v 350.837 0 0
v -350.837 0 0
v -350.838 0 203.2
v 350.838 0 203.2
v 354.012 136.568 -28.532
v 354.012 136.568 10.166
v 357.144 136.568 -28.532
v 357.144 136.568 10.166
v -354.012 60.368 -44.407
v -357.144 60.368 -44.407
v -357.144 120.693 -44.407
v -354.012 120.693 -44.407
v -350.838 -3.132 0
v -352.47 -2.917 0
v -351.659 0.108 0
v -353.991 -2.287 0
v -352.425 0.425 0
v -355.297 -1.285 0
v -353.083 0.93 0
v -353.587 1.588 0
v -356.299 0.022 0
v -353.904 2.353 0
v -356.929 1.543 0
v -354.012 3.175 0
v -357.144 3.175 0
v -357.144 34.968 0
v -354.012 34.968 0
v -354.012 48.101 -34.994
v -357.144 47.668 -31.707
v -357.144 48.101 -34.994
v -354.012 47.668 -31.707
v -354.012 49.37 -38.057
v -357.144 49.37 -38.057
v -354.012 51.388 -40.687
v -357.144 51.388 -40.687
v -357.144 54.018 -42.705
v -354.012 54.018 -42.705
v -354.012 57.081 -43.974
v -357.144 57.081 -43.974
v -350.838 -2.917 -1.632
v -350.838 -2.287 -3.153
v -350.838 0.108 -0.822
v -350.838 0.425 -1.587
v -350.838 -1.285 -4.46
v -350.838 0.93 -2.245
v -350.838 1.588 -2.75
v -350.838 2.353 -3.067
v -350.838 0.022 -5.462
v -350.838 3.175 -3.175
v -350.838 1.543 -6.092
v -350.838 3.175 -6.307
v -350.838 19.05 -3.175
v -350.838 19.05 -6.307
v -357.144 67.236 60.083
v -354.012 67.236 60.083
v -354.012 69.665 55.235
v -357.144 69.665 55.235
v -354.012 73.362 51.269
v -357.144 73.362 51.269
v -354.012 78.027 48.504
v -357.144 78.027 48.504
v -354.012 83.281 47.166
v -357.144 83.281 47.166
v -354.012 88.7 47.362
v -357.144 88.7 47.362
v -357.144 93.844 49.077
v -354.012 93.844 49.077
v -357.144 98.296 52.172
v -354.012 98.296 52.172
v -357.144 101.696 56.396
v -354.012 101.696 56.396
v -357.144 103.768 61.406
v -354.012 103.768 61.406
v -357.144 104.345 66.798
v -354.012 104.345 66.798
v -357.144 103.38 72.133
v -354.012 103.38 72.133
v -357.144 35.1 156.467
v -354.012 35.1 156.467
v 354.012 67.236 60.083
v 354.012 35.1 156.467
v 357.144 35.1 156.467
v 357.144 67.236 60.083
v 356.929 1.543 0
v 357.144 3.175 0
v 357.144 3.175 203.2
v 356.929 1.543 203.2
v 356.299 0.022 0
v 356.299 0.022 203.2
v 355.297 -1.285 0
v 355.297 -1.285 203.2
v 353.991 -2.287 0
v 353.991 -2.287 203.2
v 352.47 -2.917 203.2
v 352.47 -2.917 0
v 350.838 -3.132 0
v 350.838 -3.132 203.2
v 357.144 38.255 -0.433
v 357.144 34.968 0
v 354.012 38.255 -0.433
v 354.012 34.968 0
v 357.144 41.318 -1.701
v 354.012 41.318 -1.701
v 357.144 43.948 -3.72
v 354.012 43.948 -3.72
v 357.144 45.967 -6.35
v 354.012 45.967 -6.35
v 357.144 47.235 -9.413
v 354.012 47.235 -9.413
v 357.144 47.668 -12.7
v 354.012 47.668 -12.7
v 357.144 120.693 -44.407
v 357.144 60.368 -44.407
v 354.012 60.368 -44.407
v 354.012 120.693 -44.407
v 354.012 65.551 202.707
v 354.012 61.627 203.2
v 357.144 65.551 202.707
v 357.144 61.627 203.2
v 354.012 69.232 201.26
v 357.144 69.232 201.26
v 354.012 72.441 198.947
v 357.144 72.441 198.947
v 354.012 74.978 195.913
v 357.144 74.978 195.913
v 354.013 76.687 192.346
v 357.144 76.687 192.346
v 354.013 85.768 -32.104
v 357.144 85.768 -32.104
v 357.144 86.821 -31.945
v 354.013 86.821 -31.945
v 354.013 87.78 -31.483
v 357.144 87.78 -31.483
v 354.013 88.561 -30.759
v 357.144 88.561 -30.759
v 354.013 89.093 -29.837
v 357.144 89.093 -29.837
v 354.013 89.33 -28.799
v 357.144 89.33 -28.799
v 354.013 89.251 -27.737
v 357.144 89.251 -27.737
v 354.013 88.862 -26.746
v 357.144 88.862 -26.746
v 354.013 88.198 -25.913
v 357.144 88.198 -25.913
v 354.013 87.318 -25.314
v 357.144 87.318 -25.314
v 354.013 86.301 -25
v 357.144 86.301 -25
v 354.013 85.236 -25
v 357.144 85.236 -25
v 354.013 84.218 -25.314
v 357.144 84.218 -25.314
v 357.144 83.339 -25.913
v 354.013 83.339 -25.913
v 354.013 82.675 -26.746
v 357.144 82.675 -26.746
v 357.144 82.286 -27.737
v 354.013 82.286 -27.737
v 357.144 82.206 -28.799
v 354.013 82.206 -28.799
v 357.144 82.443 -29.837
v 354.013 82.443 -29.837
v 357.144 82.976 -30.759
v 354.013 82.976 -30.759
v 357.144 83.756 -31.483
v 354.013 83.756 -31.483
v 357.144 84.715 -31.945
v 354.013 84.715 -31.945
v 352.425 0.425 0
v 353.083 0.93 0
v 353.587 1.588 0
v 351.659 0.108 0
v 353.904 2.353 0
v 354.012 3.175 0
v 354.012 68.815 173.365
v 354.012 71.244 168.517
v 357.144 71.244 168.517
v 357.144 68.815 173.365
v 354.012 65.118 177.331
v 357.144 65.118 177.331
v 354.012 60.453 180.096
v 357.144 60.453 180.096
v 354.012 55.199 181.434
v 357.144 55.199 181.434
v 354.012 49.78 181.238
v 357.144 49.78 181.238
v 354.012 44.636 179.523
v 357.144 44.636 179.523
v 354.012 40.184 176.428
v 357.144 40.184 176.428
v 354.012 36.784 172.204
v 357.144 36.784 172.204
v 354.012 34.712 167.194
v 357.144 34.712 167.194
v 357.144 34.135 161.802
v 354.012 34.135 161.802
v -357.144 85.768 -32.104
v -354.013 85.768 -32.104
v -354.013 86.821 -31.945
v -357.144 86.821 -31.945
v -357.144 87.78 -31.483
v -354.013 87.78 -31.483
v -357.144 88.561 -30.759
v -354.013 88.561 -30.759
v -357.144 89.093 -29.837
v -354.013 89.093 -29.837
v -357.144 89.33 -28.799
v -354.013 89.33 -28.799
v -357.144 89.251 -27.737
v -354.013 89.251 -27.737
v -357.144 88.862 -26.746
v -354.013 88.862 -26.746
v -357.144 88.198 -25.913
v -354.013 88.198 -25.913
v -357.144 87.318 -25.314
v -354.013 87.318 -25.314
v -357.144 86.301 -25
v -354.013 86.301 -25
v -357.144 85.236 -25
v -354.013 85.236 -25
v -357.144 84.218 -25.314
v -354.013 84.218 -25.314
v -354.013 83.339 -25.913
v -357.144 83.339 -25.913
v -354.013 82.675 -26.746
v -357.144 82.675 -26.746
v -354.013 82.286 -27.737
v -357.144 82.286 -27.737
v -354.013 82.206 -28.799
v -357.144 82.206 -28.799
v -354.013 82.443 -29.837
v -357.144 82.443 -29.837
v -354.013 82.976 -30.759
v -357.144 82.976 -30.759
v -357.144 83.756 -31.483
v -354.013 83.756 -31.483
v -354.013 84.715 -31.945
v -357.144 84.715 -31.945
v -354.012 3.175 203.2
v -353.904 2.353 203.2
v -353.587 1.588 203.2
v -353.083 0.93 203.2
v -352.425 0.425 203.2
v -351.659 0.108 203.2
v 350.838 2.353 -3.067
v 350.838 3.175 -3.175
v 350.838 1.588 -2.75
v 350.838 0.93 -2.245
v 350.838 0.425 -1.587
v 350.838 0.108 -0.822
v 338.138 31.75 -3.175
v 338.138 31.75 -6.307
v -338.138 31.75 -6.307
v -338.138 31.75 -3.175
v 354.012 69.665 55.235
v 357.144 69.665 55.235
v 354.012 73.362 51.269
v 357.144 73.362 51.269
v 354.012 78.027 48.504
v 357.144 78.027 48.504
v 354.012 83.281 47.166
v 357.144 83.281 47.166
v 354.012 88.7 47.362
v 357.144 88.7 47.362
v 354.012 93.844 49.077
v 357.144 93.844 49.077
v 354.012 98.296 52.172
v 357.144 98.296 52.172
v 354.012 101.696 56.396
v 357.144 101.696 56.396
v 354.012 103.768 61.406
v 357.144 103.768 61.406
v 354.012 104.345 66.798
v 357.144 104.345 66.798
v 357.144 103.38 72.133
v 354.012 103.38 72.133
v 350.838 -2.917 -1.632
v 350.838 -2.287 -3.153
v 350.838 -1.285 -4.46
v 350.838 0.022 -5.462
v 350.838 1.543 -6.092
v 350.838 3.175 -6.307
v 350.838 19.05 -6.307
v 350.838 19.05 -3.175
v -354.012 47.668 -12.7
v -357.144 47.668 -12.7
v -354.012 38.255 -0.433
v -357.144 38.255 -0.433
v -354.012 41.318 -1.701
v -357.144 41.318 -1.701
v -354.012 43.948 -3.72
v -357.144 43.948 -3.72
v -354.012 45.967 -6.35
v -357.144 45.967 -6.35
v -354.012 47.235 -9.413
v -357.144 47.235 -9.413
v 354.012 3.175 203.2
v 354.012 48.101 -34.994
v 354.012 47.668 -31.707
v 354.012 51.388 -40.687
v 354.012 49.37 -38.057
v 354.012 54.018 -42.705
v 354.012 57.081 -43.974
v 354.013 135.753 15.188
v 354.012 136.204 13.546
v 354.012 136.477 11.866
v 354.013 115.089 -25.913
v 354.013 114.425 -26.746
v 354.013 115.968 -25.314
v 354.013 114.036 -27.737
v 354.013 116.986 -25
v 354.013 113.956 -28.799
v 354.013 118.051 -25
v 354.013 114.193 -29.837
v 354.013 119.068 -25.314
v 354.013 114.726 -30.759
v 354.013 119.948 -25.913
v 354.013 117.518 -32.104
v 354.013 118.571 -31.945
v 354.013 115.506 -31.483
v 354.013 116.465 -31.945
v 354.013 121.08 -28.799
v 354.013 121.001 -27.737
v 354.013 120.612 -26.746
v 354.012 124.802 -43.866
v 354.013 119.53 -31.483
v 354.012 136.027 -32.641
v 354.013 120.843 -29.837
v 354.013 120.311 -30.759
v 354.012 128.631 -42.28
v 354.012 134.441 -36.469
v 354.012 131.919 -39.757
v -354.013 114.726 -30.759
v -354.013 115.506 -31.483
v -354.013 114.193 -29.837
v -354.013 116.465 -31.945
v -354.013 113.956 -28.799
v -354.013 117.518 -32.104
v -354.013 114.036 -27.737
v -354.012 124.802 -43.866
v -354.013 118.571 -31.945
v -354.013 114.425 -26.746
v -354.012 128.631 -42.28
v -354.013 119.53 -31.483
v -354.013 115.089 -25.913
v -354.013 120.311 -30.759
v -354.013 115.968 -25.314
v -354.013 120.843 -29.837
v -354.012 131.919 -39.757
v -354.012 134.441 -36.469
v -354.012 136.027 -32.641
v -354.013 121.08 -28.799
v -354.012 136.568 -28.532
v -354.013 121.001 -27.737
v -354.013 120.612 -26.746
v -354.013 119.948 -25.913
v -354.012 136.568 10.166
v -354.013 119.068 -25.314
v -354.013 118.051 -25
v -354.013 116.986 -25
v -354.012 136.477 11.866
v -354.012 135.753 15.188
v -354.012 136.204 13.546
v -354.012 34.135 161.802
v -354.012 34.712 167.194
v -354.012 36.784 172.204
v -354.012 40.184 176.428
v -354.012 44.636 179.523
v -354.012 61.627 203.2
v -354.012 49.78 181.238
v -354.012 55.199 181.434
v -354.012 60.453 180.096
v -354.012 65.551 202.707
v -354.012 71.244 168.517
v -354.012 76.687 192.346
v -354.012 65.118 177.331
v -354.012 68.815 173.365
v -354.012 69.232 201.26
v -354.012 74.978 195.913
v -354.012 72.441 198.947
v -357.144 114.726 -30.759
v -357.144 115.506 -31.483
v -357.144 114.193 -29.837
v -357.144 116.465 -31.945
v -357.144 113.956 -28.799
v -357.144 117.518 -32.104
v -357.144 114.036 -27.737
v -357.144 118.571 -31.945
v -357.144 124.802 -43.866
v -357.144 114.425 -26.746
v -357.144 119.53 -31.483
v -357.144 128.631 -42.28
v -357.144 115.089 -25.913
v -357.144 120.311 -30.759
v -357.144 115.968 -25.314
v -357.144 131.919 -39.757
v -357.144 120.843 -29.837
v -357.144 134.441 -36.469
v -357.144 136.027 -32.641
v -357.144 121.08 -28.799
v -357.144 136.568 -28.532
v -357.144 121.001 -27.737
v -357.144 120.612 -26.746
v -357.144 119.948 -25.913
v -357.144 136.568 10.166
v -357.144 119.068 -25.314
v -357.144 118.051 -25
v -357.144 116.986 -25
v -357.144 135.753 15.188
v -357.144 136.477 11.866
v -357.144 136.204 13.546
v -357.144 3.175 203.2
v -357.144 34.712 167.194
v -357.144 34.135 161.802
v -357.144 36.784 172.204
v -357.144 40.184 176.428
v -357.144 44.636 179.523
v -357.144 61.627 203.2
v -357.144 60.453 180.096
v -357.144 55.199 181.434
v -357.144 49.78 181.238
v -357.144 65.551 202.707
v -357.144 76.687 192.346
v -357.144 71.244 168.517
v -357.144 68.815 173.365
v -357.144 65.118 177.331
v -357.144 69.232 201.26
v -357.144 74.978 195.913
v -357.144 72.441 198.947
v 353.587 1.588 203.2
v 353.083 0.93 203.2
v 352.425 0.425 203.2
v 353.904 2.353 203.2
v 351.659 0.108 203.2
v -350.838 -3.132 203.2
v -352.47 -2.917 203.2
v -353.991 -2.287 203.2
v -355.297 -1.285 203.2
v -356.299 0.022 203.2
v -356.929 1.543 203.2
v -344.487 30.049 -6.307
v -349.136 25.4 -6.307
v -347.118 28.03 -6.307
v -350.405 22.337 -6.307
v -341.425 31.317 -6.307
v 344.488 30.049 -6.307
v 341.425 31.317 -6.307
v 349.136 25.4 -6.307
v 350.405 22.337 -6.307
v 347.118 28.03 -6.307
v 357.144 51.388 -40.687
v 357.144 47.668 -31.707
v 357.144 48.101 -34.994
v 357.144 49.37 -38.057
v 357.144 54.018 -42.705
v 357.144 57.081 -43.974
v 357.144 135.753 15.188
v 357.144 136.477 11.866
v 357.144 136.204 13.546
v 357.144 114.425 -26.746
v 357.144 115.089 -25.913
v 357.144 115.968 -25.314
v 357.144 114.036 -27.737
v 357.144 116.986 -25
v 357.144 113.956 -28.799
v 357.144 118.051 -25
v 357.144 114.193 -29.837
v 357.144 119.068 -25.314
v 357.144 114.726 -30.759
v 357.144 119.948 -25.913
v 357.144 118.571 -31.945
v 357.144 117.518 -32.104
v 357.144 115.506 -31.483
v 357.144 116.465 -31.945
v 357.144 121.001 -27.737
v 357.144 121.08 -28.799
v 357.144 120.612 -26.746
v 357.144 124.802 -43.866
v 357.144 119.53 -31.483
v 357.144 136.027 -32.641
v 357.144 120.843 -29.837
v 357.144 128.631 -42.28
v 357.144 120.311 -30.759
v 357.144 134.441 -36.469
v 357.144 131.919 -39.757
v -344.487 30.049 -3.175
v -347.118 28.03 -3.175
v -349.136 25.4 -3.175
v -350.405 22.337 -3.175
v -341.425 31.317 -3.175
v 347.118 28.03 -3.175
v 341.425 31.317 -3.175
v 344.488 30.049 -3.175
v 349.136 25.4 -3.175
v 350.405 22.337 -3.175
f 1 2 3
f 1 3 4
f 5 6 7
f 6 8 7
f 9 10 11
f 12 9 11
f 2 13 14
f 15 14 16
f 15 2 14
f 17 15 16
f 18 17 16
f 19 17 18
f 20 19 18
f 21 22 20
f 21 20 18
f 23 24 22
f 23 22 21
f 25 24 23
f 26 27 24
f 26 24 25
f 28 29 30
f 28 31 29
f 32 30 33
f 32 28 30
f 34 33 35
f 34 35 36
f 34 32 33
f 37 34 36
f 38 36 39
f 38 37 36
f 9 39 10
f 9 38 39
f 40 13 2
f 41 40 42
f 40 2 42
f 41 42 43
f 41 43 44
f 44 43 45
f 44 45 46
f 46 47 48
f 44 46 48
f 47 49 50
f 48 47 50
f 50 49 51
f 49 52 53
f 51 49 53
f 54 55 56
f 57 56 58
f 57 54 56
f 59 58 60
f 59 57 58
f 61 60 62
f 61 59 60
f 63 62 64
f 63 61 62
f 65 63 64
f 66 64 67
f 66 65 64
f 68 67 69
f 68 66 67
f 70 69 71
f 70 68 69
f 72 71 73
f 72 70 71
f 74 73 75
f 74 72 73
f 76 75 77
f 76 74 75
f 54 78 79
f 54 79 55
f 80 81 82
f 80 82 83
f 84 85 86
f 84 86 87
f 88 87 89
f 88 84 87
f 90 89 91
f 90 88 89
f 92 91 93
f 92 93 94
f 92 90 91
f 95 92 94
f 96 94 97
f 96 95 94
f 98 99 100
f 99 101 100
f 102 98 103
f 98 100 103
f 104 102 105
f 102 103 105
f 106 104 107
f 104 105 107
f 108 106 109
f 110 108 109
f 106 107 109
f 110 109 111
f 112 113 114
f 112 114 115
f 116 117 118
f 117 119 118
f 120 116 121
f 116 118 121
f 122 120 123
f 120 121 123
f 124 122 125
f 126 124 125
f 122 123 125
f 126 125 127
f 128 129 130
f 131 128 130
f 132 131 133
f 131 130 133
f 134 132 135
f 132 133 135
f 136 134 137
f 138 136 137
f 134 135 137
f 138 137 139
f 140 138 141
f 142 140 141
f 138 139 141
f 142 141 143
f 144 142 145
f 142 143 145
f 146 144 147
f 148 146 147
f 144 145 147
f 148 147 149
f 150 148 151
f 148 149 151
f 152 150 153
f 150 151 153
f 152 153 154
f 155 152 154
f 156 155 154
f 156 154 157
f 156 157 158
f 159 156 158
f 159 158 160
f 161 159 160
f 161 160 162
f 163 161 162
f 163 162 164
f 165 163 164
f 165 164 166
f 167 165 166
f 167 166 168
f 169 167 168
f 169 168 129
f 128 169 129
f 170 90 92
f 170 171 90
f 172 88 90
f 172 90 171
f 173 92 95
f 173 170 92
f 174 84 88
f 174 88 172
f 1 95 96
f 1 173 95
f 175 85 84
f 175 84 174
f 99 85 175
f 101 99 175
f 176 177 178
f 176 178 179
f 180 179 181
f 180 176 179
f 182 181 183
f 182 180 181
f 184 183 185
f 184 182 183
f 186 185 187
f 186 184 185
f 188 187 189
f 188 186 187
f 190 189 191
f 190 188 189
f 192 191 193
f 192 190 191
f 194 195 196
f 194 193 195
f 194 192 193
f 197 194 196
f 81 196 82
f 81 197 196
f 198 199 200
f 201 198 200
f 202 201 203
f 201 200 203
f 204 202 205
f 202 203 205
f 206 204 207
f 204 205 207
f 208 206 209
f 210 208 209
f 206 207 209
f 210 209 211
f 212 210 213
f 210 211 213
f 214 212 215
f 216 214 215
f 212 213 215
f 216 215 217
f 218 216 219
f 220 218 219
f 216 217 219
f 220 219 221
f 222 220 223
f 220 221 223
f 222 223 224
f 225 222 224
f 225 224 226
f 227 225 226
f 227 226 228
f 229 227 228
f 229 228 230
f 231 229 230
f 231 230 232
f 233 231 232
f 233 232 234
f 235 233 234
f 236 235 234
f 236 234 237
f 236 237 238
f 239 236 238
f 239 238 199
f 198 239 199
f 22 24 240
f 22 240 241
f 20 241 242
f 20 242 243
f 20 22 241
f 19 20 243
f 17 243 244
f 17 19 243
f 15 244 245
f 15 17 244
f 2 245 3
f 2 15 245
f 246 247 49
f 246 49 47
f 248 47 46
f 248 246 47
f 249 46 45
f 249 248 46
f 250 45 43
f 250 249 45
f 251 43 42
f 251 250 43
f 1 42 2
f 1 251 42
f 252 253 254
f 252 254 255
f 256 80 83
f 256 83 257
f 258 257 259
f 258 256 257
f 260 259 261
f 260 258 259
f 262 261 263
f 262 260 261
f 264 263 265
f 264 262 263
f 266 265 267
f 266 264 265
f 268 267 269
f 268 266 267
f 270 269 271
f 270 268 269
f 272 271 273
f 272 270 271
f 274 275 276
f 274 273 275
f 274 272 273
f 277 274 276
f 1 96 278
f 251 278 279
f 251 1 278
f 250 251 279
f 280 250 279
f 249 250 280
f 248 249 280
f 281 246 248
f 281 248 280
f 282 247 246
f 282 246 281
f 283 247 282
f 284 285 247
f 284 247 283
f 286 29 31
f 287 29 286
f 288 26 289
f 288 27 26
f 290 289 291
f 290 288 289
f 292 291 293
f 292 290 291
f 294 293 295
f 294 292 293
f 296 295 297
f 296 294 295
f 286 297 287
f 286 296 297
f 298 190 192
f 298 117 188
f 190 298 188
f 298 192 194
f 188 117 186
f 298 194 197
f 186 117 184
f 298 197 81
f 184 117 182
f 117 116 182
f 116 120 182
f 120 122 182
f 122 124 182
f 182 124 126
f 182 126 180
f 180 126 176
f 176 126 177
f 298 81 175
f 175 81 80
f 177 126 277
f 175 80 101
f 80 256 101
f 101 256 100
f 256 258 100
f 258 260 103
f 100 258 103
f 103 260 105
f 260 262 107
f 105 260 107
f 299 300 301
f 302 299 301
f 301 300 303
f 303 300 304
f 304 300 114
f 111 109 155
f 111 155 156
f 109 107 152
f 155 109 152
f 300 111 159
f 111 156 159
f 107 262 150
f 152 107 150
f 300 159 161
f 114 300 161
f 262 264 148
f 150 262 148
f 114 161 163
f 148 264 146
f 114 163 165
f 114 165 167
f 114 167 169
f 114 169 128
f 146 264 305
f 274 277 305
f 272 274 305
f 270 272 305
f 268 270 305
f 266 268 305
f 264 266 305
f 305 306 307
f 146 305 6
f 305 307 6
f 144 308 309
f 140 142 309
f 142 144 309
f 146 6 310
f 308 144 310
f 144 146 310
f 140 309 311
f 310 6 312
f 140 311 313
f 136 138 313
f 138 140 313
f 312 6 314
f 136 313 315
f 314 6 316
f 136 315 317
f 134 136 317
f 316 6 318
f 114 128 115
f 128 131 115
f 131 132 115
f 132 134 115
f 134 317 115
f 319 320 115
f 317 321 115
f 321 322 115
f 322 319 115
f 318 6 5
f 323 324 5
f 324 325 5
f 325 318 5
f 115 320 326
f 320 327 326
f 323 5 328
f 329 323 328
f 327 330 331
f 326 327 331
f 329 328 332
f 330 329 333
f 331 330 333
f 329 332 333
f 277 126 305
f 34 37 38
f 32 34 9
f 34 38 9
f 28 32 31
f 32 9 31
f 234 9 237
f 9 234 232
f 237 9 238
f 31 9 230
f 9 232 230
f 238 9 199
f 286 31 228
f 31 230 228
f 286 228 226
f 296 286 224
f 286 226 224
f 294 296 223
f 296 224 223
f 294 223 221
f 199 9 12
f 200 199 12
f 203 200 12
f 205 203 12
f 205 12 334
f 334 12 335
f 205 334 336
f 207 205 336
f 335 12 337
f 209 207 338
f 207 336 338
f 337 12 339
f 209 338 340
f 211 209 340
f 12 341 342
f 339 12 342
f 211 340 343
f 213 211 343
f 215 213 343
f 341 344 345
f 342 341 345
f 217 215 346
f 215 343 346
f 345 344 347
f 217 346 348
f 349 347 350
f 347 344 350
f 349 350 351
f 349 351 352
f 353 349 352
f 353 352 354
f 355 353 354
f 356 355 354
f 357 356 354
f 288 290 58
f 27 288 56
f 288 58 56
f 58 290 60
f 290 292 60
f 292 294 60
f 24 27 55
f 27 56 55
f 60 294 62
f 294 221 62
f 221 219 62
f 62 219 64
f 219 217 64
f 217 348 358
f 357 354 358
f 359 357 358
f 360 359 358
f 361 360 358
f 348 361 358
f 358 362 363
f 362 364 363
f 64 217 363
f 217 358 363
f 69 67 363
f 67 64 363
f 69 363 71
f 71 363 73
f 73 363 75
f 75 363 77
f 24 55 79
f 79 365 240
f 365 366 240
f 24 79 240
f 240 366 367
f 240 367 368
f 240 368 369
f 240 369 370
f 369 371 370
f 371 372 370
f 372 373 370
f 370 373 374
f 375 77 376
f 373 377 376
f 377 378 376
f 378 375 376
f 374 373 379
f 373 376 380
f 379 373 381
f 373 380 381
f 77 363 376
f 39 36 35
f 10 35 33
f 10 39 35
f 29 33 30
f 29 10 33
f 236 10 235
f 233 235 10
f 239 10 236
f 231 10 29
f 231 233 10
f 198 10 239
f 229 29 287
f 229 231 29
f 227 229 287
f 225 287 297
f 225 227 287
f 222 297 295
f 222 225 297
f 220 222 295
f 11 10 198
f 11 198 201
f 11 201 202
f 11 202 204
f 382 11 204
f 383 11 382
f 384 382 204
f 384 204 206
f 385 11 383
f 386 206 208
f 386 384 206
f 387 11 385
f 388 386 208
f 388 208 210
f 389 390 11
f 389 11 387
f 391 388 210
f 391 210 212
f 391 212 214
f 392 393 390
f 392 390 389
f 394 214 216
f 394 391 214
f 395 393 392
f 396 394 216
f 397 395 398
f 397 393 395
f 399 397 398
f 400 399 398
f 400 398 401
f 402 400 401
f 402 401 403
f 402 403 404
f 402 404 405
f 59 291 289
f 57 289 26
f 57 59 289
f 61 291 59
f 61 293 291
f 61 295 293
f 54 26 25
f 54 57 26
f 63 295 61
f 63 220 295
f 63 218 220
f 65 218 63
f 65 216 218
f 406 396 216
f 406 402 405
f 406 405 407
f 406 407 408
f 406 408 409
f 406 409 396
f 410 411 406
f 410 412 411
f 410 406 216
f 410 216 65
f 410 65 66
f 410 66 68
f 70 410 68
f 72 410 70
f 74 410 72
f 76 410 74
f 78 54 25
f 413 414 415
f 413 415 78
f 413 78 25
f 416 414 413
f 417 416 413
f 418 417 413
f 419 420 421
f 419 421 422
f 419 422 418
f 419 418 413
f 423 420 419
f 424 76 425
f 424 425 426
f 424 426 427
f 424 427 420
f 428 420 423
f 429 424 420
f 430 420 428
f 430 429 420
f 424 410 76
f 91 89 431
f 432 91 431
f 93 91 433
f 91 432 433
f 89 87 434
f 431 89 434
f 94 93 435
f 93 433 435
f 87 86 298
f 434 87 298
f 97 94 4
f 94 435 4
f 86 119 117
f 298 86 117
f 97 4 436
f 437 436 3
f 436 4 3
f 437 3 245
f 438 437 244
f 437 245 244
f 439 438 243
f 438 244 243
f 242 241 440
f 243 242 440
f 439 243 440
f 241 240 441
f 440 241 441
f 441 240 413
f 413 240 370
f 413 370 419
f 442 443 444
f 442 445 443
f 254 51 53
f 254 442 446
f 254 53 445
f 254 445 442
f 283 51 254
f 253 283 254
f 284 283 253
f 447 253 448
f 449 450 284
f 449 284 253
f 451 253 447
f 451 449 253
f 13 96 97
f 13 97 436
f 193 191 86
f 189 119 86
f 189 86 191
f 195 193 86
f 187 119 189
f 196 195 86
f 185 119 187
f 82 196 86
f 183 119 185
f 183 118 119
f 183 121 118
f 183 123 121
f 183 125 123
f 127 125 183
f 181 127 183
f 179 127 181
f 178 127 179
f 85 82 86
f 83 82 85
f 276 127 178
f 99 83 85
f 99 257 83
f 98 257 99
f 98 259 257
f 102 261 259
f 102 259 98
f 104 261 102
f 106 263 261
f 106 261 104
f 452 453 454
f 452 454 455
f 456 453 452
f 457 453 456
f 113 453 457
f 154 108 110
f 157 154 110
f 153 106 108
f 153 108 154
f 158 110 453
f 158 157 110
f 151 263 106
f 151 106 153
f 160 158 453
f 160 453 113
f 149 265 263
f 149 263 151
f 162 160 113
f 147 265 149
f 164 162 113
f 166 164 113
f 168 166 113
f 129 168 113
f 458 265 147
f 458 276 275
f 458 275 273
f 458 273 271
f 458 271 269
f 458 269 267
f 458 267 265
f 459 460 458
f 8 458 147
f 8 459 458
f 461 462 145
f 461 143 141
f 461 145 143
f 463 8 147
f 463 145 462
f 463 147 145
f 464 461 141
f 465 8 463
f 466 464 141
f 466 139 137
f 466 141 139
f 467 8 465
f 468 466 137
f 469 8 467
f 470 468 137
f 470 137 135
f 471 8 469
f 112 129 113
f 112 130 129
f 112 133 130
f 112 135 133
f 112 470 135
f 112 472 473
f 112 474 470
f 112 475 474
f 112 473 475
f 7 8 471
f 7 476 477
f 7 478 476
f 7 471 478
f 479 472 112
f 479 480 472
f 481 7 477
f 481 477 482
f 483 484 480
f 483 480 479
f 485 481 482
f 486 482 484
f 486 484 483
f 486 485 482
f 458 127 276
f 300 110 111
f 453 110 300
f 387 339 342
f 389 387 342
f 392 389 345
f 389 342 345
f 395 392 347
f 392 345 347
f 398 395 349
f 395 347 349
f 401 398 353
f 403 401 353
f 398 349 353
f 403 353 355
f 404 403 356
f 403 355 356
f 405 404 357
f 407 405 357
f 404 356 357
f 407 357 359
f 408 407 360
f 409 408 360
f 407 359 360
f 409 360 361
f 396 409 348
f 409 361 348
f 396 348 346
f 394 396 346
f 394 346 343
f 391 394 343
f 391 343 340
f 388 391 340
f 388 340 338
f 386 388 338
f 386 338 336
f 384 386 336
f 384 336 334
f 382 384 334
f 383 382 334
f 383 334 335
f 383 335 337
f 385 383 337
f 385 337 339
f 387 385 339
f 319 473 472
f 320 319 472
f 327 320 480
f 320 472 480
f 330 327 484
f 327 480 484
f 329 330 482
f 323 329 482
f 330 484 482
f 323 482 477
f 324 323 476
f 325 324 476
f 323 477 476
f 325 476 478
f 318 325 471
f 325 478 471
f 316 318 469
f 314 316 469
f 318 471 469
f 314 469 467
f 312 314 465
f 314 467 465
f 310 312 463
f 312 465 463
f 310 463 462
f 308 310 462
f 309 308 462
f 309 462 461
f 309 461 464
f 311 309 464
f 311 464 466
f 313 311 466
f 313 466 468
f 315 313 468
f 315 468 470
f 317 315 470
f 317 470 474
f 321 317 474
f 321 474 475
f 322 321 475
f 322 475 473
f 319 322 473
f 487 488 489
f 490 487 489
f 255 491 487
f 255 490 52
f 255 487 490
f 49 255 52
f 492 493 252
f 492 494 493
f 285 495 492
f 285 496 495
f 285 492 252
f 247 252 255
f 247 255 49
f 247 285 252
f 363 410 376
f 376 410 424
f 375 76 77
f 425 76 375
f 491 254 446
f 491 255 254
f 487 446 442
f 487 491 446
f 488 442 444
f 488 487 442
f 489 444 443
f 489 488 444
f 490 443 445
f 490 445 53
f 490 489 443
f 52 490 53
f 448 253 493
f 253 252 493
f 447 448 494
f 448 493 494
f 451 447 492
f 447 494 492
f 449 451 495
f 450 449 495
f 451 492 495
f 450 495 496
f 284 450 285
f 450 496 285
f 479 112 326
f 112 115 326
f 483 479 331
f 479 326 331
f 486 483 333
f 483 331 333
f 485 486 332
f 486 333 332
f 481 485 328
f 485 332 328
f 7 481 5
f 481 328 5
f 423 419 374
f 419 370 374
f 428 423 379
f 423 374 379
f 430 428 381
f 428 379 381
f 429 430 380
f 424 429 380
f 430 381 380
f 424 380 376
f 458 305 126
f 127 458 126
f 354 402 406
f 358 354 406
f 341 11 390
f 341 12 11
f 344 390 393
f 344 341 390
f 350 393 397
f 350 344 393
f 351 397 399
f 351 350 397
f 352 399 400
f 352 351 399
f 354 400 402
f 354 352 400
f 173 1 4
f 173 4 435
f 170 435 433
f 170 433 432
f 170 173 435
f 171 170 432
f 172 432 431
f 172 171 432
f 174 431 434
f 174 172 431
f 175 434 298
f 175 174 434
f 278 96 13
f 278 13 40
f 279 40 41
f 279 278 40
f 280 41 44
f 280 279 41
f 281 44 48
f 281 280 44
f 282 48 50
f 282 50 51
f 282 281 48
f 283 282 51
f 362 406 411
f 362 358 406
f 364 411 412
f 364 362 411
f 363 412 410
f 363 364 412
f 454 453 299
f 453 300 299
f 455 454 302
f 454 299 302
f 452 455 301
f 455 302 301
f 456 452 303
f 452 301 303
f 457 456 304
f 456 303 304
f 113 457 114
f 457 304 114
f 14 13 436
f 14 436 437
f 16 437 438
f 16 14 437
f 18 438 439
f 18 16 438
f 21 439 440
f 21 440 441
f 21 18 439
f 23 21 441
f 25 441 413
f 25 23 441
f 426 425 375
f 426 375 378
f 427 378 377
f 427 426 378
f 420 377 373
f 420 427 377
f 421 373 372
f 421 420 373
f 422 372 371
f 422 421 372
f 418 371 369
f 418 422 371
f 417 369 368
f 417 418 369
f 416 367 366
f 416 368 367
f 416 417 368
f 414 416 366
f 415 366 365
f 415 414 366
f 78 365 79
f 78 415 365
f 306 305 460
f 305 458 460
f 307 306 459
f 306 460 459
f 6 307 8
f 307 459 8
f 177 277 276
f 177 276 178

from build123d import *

# Parameters (mm, degrees)
BASE_FLANGE1_DEPTH              = 203.2
SKETCH6_W                       = 44.40682
SKETCH6_H                       = 88.9
BOSS_EXTRUDE1_DEPTH             = 3.13182
SKETCH7_W                       = 44.40682
SKETCH7_H                       = 88.9
BOSS_EXTRUDE2_DEPTH             = 3.13182
CUT_EXTRUDE1_DEPTH              = 756.082359098
F_9_32_0_28125_DIAMETER_HOLE1_D = 7.14375
EDGE_FLANGE1_DEPTH              = 701.675
FILLET1_R                       = 12.7
FILLET2_R                       = 15.875


# Sheet-metal steps are written as plain solids
with BuildPart() as part:
    # Sketch1 → Base-Flange1 (new body)
    with BuildSketch(Plane.XY):
        with BuildLine():
            Line((-354.0125, 136.56818), (-354.0125, 3.175))
            ThreePointArc((-354.0125, 3.175), (-353.08256403, 0.92993597), (-350.8375, 0))
            Line((-350.8375, 0), (350.8375, 0))
            ThreePointArc((350.8375, 0), (353.08256403, 0.92993597), (354.0125, 3.175))
            Line((354.0125, 3.175), (354.0125, 136.56818))
            Line((354.0125, 136.56818), (357.14432, 136.56818))
            Line((357.14432, 136.56818), (357.14432, 3.175))
            ThreePointArc((357.14432, 3.175), (355.29709519, -1.28459519), (350.8375, -3.13182))
            Line((350.8375, -3.13182), (-350.8375, -3.13182))
            ThreePointArc((-350.8375, -3.13182), (-355.29709519, -1.28459519), (-357.14432, 3.175))
            Line((-357.14432, 3.175), (-357.14432, 136.56818))
            Line((-357.14432, 136.56818), (-354.0125, 136.56818))
        make_face()
    extrude(amount=BASE_FLANGE1_DEPTH)

    # Sketch6 → Boss-Extrude1 (add)
    with BuildSketch(Plane(origin=(357.14432, 0, 0), x_dir=(0, 0, -1), z_dir=(1, 0, 0))):
        with Locations((22.20341, 92.11818)):
            Rectangle(SKETCH6_W, SKETCH6_H)
    extrude(amount=-BOSS_EXTRUDE1_DEPTH)

    # Sketch7 → Boss-Extrude2 (add)
    with BuildSketch(Plane.ZY.offset(357.14432)):
        with Locations((-22.20341, 92.11818)):
            Rectangle(SKETCH7_W, SKETCH7_H)
    extrude(amount=-BOSS_EXTRUDE2_DEPTH)

    # Sketch8 → Cut-Extrude1 (cut, through all)
    with BuildSketch(Plane.ZY.offset(357.14432)):
        with BuildLine():
            Line((72.133349274, 103.379689668), (168.517386933, 71.244393115))
            ThreePointArc((168.517386933, 71.244393115), (180.56402589, 47.14701795), (156.466650726, 35.100378992))
            Line((156.466650726, 35.100378992), (60.082613067, 67.235675546))
            ThreePointArc((60.082613067, 67.235675546), (48.03597411, 91.333050711), (72.133349274, 103.379689668))
        make_face()
        Polygon((12.74318, 136.56818), (203.2, 73.06818), (203.2, 136.56818), align=None)
    extrude(amount=-CUT_EXTRUDE1_DEPTH, mode=Mode.SUBTRACT)

    # 9/32 (0.28125) Diameter Hole1 (through all)
    with Locations(Plane.ZY.offset(357.14432)):
        with Locations((-28.53182, 85.76818), (-28.53182, 117.51818)):
            Hole(F_9_32_0_28125_DIAMETER_HOLE1_D / 2)

    # Edge-Flange1 section (across the edge) → Edge-Flange1 (add)
    with BuildSketch(Plane(origin=(350.8375, 0, -3.175), x_dir=(0, 0, 1), z_dir=(-1, 0, 0))):
        with BuildLine():
            Line((-3.13182, 3.175), (-3.13182, 31.75))
            Line((-3.13182, 31.75), (0, 31.75))
            Line((0, 31.75), (0, 3.175))
            ThreePointArc((0, 3.175), (0.92993597, 0.92993597), (3.175, 0))
            Line((3.175, 0), (3.175, -3.13182))
            ThreePointArc((3.175, -3.13182), (-1.28459519, -1.28459519), (-3.13182, 3.175))
        make_face()
    extrude(amount=EDGE_FLANGE1_DEPTH)

    # Fillet1
    fillet1_edges = [part.edges().sort_by_distance(p)[0] for p in [
        (350.8375, 31.75, -4.74091),
        (-350.8375, 31.75, -4.74091),
        (355.57841, 47.66818, -44.40682),
        (355.57841, 47.66818, 0),
        (-355.57841, 47.66818, 0),
        (-355.57841, 47.66818, -44.40682),
    ]]
    fillet(fillet1_edges, radius=FILLET1_R)

    # Fillet2
    fillet2_edges = [part.edges().sort_by_distance(p)[0] for p in [
        (355.57841, 136.56818, -44.40682),
        (-355.57841, 136.56818, -44.40682),
        (-355.57841, 73.06818, 203.2),
        (355.57841, 73.06818, 203.2),
        (355.57841, 136.56818, 12.74318),
        (-355.57841, 136.56818, 12.74318),
    ]]
    fillet(fillet2_edges, radius=FILLET2_R)


solid = part.part
